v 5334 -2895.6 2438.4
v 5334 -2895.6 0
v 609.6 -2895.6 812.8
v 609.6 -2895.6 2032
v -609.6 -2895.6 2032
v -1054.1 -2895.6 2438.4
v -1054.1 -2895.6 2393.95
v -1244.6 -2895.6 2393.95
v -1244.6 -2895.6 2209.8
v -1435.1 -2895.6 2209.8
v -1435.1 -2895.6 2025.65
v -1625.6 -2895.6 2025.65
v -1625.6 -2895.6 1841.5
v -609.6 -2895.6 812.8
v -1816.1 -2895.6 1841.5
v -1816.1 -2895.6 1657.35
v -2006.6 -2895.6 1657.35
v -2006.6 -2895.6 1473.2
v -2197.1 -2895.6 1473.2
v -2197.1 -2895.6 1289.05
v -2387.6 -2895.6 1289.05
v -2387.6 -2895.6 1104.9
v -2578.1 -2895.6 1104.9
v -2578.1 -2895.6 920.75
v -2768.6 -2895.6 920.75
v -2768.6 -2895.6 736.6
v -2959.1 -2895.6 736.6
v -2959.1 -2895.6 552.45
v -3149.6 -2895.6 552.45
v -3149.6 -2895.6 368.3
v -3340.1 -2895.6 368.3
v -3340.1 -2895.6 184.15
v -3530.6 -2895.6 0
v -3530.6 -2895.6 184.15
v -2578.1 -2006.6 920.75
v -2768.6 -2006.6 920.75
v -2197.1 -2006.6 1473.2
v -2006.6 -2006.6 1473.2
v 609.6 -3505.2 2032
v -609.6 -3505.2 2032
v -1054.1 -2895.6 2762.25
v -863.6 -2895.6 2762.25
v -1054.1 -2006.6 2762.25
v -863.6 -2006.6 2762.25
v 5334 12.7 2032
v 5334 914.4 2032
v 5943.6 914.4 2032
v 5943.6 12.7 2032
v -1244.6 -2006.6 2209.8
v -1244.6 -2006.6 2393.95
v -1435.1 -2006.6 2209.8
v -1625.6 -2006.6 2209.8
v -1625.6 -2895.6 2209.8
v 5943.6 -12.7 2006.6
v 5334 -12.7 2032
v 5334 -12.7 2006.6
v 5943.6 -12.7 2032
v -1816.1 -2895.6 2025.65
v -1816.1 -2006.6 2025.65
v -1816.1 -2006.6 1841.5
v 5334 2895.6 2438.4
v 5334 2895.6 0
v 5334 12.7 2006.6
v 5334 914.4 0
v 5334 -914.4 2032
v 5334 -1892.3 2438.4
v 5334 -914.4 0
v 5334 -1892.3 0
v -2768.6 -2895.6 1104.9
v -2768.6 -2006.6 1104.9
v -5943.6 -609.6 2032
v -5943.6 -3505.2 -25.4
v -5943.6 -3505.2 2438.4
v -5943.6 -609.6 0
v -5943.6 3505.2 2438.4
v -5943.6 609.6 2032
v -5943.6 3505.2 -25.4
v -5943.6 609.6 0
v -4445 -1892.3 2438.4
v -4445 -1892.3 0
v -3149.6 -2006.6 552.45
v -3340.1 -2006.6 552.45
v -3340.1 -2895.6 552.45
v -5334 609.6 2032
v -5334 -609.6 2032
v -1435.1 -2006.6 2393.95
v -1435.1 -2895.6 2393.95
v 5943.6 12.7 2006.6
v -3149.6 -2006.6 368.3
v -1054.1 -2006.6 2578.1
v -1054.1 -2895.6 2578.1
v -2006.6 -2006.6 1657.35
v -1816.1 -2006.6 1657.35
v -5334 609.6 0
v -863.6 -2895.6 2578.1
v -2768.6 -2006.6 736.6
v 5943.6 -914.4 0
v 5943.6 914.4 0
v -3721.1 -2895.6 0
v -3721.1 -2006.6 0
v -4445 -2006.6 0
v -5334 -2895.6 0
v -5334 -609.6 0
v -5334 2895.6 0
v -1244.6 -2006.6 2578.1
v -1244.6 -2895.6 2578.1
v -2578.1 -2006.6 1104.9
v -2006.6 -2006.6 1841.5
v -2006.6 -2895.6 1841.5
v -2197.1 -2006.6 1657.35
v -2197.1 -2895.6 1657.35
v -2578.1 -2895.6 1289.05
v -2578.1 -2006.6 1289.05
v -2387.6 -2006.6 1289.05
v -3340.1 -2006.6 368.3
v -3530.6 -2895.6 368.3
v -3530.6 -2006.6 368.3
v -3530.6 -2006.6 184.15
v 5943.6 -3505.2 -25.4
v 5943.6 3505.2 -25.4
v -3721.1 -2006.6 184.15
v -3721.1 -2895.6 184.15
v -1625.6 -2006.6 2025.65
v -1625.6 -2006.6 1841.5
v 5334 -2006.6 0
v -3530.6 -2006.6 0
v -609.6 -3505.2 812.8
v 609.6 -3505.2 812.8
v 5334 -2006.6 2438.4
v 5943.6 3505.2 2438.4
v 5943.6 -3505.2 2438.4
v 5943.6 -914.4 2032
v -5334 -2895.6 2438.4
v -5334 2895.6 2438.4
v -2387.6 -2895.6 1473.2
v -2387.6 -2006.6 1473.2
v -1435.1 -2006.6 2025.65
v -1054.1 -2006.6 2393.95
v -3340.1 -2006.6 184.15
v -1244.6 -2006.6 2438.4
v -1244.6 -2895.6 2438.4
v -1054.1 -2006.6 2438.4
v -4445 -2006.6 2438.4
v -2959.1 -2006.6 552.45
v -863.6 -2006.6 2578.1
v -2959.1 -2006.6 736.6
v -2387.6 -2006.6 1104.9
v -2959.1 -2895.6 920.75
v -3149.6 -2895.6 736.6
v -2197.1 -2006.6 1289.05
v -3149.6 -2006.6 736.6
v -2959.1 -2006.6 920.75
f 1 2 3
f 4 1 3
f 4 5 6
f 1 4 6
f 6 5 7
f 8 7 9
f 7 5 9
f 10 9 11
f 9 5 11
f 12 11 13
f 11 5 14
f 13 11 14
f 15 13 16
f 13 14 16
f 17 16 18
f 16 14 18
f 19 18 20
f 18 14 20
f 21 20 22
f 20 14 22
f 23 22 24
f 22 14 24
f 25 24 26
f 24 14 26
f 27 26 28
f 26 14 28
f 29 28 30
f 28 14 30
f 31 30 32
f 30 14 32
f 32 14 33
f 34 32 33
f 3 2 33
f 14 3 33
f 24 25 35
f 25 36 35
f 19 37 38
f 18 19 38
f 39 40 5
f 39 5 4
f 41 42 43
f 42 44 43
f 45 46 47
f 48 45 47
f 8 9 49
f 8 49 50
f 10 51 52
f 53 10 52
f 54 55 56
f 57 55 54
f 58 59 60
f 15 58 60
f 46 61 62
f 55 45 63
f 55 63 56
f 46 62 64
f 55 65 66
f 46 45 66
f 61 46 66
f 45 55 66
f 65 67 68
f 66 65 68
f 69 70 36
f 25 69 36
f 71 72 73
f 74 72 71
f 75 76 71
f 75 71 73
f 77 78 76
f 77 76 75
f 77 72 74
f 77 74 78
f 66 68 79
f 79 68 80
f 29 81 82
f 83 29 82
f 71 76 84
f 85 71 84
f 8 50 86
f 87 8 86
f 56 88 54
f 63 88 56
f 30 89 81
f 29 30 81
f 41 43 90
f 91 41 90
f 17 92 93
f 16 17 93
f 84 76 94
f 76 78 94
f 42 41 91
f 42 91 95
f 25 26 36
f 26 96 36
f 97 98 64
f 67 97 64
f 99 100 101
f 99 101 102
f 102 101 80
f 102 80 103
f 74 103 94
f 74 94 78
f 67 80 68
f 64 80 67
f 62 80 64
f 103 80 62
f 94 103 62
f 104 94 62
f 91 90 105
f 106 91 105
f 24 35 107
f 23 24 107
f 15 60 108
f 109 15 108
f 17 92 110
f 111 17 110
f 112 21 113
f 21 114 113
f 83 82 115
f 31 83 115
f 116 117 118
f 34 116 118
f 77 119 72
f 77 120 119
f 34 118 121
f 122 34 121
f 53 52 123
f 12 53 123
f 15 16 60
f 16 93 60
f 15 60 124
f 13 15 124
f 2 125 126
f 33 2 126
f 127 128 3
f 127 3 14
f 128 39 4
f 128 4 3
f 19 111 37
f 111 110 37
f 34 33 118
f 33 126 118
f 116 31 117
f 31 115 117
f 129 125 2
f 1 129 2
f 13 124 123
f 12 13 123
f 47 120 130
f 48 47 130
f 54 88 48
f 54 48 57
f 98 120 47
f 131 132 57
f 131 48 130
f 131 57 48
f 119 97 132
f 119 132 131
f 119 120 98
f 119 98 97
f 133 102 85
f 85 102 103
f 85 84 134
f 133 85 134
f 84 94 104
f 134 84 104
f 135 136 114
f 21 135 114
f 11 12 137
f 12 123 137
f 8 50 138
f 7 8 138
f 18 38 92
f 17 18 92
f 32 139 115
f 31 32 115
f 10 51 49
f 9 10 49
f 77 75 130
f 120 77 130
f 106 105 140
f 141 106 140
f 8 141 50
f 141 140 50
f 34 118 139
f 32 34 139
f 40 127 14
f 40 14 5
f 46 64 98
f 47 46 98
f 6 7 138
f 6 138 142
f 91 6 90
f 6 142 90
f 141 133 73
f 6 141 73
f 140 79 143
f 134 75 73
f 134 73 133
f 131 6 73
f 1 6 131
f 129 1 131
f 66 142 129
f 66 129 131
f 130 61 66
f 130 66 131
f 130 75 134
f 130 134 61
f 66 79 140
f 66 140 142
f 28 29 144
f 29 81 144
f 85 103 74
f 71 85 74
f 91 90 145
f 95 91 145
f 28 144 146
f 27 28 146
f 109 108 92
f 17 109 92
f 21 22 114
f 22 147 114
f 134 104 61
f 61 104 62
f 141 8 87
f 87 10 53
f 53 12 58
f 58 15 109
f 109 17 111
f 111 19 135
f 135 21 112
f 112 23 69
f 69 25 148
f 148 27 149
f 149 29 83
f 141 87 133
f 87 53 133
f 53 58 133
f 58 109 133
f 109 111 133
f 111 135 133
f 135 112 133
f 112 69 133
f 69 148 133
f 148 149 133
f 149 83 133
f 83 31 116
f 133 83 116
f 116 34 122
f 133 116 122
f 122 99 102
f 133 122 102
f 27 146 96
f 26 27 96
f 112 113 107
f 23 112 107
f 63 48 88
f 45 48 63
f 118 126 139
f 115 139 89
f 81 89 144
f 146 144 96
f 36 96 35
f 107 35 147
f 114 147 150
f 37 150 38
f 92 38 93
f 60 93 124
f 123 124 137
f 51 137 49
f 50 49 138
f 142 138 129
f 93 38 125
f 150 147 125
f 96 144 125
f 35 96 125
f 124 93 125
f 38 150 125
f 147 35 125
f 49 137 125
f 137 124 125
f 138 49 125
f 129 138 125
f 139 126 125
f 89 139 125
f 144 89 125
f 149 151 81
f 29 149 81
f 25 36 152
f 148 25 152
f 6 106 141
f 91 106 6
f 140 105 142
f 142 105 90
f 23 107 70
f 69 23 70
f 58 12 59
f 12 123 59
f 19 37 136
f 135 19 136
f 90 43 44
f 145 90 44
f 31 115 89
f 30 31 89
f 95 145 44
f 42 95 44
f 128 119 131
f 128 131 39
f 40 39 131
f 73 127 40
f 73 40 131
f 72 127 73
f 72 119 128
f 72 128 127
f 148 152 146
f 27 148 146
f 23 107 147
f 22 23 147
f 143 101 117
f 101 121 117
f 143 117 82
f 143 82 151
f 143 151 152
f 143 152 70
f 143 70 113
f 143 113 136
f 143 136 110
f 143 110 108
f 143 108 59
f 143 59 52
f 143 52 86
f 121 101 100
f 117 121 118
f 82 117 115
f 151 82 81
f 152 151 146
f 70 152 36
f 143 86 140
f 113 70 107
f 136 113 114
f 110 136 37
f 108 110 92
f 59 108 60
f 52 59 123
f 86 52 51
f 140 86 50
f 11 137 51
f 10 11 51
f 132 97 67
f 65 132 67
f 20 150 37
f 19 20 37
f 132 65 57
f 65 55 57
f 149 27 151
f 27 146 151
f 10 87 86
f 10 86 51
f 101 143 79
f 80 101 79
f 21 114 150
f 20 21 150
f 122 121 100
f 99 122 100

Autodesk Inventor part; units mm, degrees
ref_plane "YZ Plane" through (0, 0, 0) normal (1, 0, 0) x (0, 1, 0)
ref_plane "XZ Plane" through (0, 0, 0) normal (0, 1, 0) x (-1, 0, 0)
ref_plane "XY Plane" through (0, 0, 0) normal (0, 0, 1) x (1, 0, 0)
sketch "Sketch1" plane through (0, 0, 0) normal (0, 0, 1) x (1, 0, 0)
  line L0 (-8321.04, 0) -> (8321.04, 0) projected
  line L1 (-5943.6, 3505.2) -> (5943.6, 3505.2)
  line L2 (-5334, 2895.6) -> (5334, 2895.6)
  line L3 (-4572, 2895.6) -> (-4419.6, 2895.6)
  line L4 (-1981.2, -2006.6) -> (-4445, -2006.6)
  line L5 (-4445, -2006.6) -> (-4445, -1892.3)
  line L6 (-1219.2, -2895.6) -> (-1066.8, -2895.6)
  line L7 (5334, -2895.6) -> (0, -2895.6)
  line L8 (0, -2895.6) -> (-5334, -2895.6)
  line L9 (5943.6, -3505.2) -> (0, -3505.2)
  line L10 (0, -3505.2) -> (-5943.6, -3505.2)
  line L11 (5334, 914.4) -> (5943.6, 914.4)
  line L12 (5943.6, -914.4) -> (5334, -914.4)
  line L13 (5334, 2895.6) -> (5334, 914.4)
  line L14 (5334, -914.4) -> (5334, -2895.6)
  line L15 (5943.6, 3505.2) -> (5943.6, 914.4)
  line L16 (5943.6, -914.4) -> (5943.6, -3505.2)
  line L17 (-4445, -2006.6) -> (5334, -2006.6)
  line L18 (5334, -1892.3) -> (-4445, -1892.3)
  line L19 (-4445, -1892.3) -> (-4445, -2006.6)
  line L20 (5334, -1892.3) -> (5334, -2006.6)
  line L21 (-5943.6, 609.6) -> (-5334, 609.6)
  line L22 (-5334, -609.6) -> (-5943.6, -609.6)
  line L23 (-5943.6, -3505.2) -> (-5943.6, -609.6)
  line L24 (-5943.6, 609.6) -> (-5943.6, 3505.2)
  line L25 (-5334, -2895.6) -> (-5334, -609.6)
  line L26 (-5334, 609.6) -> (-5334, 2895.6)
  line L27 (-4445, -2006.6) -> (-4419.6, -2006.6)
  line L28 (-4419.6, 2895.6) -> (-4572, 2895.6)
  line L29 (-4445, -1892.3) -> (-4445, -2006.6)
  line L30 (0, -4907.28) -> (0, 4907.28) projected
  dimension "d18" = 7010.4
  dimension "d19" = 609.6
  dimension "d20" = 609.6
  dimension "d23" = 1828.8
  dimension "d24" = 2590.8
  dimension "d25" = 609.6
  dimension "d28" = 114.3
  dimension "d29" = 0
  dimension "d34" = 1219.2
  dimension "d35" = 2895.6
  dimension "d36" = 609.6
  dimension "d46" = 889
  dimension "d105" = 889
  dimension "d106" = 11887.2
extrude "Extrusion9" add sketch "Sketch1" along normal blind 2438.4 contours L18 L14 L17 L30 | L30 L17 L4 L5 L18 | L1 L30 L2 L26 L21 L24 | L1 L15 L11 L13 L2 L30 | L14 L12 L16 L9 L30 L7 | L30 L10 L23 L22 L25 L8 L6
sketch "Sketch8" plane through (0, 0, 0) normal (0, 0, -1) x (-1, 0, 0)
  line L0 (5943.6, 3505.2) -> (-5943.6, 3505.2) projected
  line L1 (-5943.6, 3505.2) -> (-5943.6, 914.4) projected
  line L2 (-5943.6, 914.4) -> (-5334, 914.4) projected
  line L3 (-5334, 914.4) -> (-5334, 2895.6) projected
  line L4 (-5334, 2895.6) -> (5334, 2895.6) projected
  line L5 (5334, 2895.6) -> (5334, 609.6) projected
  line L6 (5334, 609.6) -> (5943.6, 609.6) projected
  line L7 (5943.6, 609.6) -> (5943.6, 3505.2) projected
  line L8 (-5943.6, 3505.2) -> (5943.6, 3505.2)
  line L9 (5943.6, 3505.2) -> (5943.6, -3505.2)
  line L10 (5943.6, -3505.2) -> (-5943.6, -3505.2)
  line L11 (-5943.6, -3505.2) -> (-5943.6, 3505.2)
  point P0 (0, 0)
extrude "Extrusion10" add sketch "Sketch8" along normal blind 25.4
sketch "Sketch9" plane through (0, 0, 2438.4) normal (0, 0, 1) x (1, 0, 0)
  line L0 (5943.6, 3505.2) -> (-5943.6, 3505.2) projected
  line L1 (-5943.6, 3505.2) -> (-5943.6, 609.6) projected
  line L2 (-5943.6, 609.6) -> (-5334, 609.6) projected
  line L3 (-5334, 609.6) -> (-5334, 2895.6) projected
  line L4 (-5334, 2895.6) -> (5334, 2895.6) projected
  line L5 (5334, 2895.6) -> (5334, 914.4) projected
  line L6 (5334, 914.4) -> (5943.6, 914.4) projected
  line L7 (5943.6, 914.4) -> (5943.6, 3505.2) projected
  line L8 (-5943.6, 609.6) -> (-5334, 609.6)
  line L9 (-5334, 609.6) -> (-5334, -609.6)
  line L10 (-5334, -609.6) -> (-5943.6, -609.6)
  line L11 (-5943.6, -609.6) -> (-5943.6, 609.6)
  line L12 (5334, 914.4) -> (5943.6, 914.4)
  line L13 (5943.6, 914.4) -> (5943.6, -914.4)
  line L14 (5943.6, -914.4) -> (5334, -914.4)
  line L15 (5334, -914.4) -> (5334, 914.4)
  point P0 (0, 0)
extrude "Extrusion11" add sketch "Sketch9" against normal blind 406.4 contours L13 L14 L15 L6 | L2 L9 L10 L11
sketch "Sketch10" plane through (-4445, -2006.6, 2438.4) normal (0, -1, 0) x (1, 0, 0)
  line L0 (0, -2438.4) -> (9779, -2438.4) projected
  line L1 (0, -2438.4) -> (0, 0) projected
  line L2 (723.9, -2438.4) -> (914.4, -2438.4)
  line L3 (914.4, -2438.4) -> (914.4, -2254.25)
  line L4 (914.4, -2254.25) -> (723.9, -2254.25)
  line L5 (723.9, -2254.25) -> (723.9, -2438.4)
  line L6 (914.4, -2254.25) -> (1104.9, -2254.25)
  line L7 (1104.9, -2254.25) -> (1104.9, -2070.1)
  line L8 (1104.9, -2070.1) -> (914.4, -2070.1)
  line L9 (914.4, -2070.1) -> (914.4, -2254.25)
  line L10 (1104.9, -2070.1) -> (1295.4, -2070.1)
  line L11 (1295.4, -2070.1) -> (1295.4, -1885.95)
  line L12 (1295.4, -1885.95) -> (1104.9, -1885.95)
  line L13 (1104.9, -1885.95) -> (1104.9, -2070.1)
  line L14 (1295.4, -1885.95) -> (1485.9, -1885.95)
  line L15 (1485.9, -1885.95) -> (1485.9, -1701.8)
  line L16 (1485.9, -1701.8) -> (1295.4, -1701.8)
  line L17 (1295.4, -1701.8) -> (1295.4, -1885.95)
  line L18 (1485.9, -1701.8) -> (1676.4, -1701.8)
  line L19 (1676.4, -1701.8) -> (1676.4, -1517.65)
  line L20 (1676.4, -1517.65) -> (1485.9, -1517.65)
  line L21 (1485.9, -1517.65) -> (1485.9, -1701.8)
  line L22 (1676.4, -1517.65) -> (1866.9, -1517.65)
  line L23 (1866.9, -1517.65) -> (1866.9, -1333.5)
  line L24 (1866.9, -1333.5) -> (1676.4, -1333.5)
  line L25 (1676.4, -1333.5) -> (1676.4, -1517.65)
  line L26 (1866.9, -1333.5) -> (2057.4, -1333.5)
  line L27 (2057.4, -1333.5) -> (2057.4, -1149.35)
  line L28 (2057.4, -1149.35) -> (1866.9, -1149.35)
  line L29 (1866.9, -1149.35) -> (1866.9, -1333.5)
  line L30 (2438.4, -965.2) -> (2438.4, -781.05)
  line L31 (2247.9, -1149.35) -> (2247.9, -965.2)
  line L32 (2247.9, -965.2) -> (2438.4, -965.2)
  line L33 (2438.4, -781.05) -> (2247.9, -781.05)
  line L34 (2247.9, -781.05) -> (2247.9, -965.2)
  line L35 (2057.4, -1149.35) -> (2247.9, -1149.35)
  line L36 (2247.9, -965.2) -> (2057.4, -965.2)
  line L37 (2057.4, -965.2) -> (2057.4, -1149.35)
  line L38 (2628.9, -781.05) -> (2628.9, -596.9)
  line L39 (2438.4, -781.05) -> (2628.9, -781.05)
  line L40 (2628.9, -596.9) -> (2438.4, -596.9)
  line L41 (2438.4, -596.9) -> (2438.4, -781.05)
  line L42 (3200.4, -228.6) -> (3200.4, -44.45)
  line L43 (3200.4, 139.7) -> (3200.4, -44.45)
  line L44 (3200.4, -44.45) -> (3390.9, -44.45)
  line L45 (3390.9, 139.7) -> (3200.4, 139.7)
  line L46 (3009.9, -44.45) -> (3009.9, -228.6)
  line L47 (3009.9, -228.6) -> (3200.4, -228.6)
  line L48 (3200.4, -44.45) -> (3009.9, -44.45)
  line L49 (3390.9, -44.45) -> (3390.9, 139.7)
  line L50 (3009.9, -412.75) -> (3009.9, -228.6)
  line L51 (3009.9, -228.6) -> (2819.4, -228.6)
  line L52 (2819.4, -412.75) -> (3009.9, -412.75)
  line L53 (2819.4, -228.6) -> (2819.4, -412.75)
  line L54 (2819.4, -596.9) -> (2819.4, -412.75)
  line L55 (2819.4, -412.75) -> (2628.9, -412.75)
  line L56 (2628.9, -596.9) -> (2819.4, -596.9)
  line L57 (2628.9, -412.75) -> (2628.9, -596.9)
  line L58 (3390.9, 139.7) -> (3581.4, 139.7)
  line L59 (3581.4, 139.7) -> (3581.4, 323.85)
  line L60 (3581.4, 323.85) -> (3390.9, 323.85)
  line L61 (3390.9, 323.85) -> (3390.9, 139.7)
  point P0 (8445.5, -2438.4)
  point P1 (4445, -2438.4)
  dimension "d113" = 190.5
  dimension "d115" = 184.15
  dimension "d116" = 723.9
  dimension "d117" = 190.5
  dimension "d118" = 184.15
  dimension "d119" = 190.5
  dimension "d120" = 184.15
  dimension "d121" = 190.5
  dimension "d122" = 184.15
  dimension "d123" = 190.5
  dimension "d124" = 184.15
  dimension "d125" = 190.5
  dimension "d126" = 184.15
  dimension "d127" = 190.5
  dimension "d128" = 184.15
  dimension "d129" = 190.5
  dimension "d130" = 184.15
  dimension "d131" = 190.5
  dimension "d132" = 184.15
  dimension "d133" = 190.5
  dimension "d134" = 184.15
  dimension "d135" = 190.5
  dimension "d136" = 184.15
  dimension "d137" = 190.5
  dimension "d138" = 184.15
  dimension "d139" = 190.5
  dimension "d140" = 184.15
  dimension "d141" = 190.5
  dimension "d142" = 184.15
  dimension "d154" = 184.15
  dimension "d155" = 190.5
extrude "Extrusion12" add sketch "Sketch10" along normal up to surface (889 mm away)
sketch "Sketch11" plane through (-5943.6, -3505.2, 2438.4) normal (0, -1, 0) x (1, 0, 0)
  line L0 (5334, -406.4) -> (6553.2, -406.4)
  line L1 (6553.2, -406.4) -> (6553.2, -1625.6)
  line L2 (6553.2, -1625.6) -> (5334, -1625.6)
  line L3 (5334, -1625.6) -> (5334, -406.4)
  line L4 (11277.6, -2438.4) -> (2413, -2438.4) projected
  line L5 (5943.6, -3021.33) -> (5943.6, 881.38) projected
  point P0 (5943.6, -2438.4)
  dimension "d145" = 1219.2
  dimension "d147" = 1219.2
  dimension "d148" = 812.8
extrude "Extrusion13" cut sketch "Sketch11" against normal up to surface (609.6 mm away)
sketch "Sketch14" plane through (0, 0, 2032) normal (0, 0, -1) x (-1, 0, 0)
  line L0 (-5334, -914.4) -> (-5334, 914.4) projected
  line L1 (-5943.6, 914.4) -> (-5943.6, -914.4) projected
  line L2 (-8321.04, 0) -> (8321.04, 0) projected
  line L3 (-5943.6, 12.7) -> (-5334, 12.7)
  line L4 (-5334, 12.7) -> (-5334, -12.7)
  line L5 (-5334, -12.7) -> (-5943.6, -12.7)
  line L6 (-5943.6, -12.7) -> (-5943.6, 12.7)
  point P0 (0, 0)
  dimension "d156" = 25.4
extrude "Extrusion15" add sketch "Sketch14" along normal blind 25.4
sketch "Sketch12" plane through (0, 0, 2438.4) normal (0, 0, 1) x (1, 0, 0)
  line L0 (-5943.6, -3505.2) -> (5943.6, -3505.2) projected
  line L1 (5943.6, -3505.2) -> (5943.6, 3505.2) projected
  line L2 (5943.6, 3505.2) -> (-5943.6, 3505.2) projected
  line L3 (-5943.6, 3505.2) -> (5943.6, 3505.2)
  line L4 (5943.6, 3505.2) -> (5943.6, -2463.8)
  line L5 (5943.6, -2463.8) -> (-5943.6, -2463.8)
  line L6 (-5943.6, -2463.8) -> (-5943.6, 3505.2)
  line L7 (-1054.1, -2006.6) -> (5943.6, -2006.6)
  line L8 (5943.6, -2006.6) -> (5943.6, -3505.2)
  line L9 (5943.6, -3505.2) -> (-1054.1, -3505.2)
  line L10 (-1054.1, -3505.2) -> (-1054.1, -2006.6)
  line L11 (-5943.6, -2463.8) -> (-5181.6, -2463.8)
  line L12 (-5181.6, -2463.8) -> (-5181.6, -3505.2)
  line L13 (-5181.6, -3505.2) -> (-5943.6, -3505.2)
  line L14 (-5943.6, -3505.2) -> (-5943.6, -2463.8)
  line L15 (-1054.1, -2895.6) -> (-5943.6, -2895.6)
  line L16 (-5943.6, -2895.6) -> (-5943.6, -3505.2)
  line L17 (-5943.6, -3505.2) -> (-1054.1, -3505.2)
  line L18 (-1054.1, -3505.2) -> (-1054.1, -2895.6)
  point P0 (0, 0)
properties part number "1st Floor Updated"
